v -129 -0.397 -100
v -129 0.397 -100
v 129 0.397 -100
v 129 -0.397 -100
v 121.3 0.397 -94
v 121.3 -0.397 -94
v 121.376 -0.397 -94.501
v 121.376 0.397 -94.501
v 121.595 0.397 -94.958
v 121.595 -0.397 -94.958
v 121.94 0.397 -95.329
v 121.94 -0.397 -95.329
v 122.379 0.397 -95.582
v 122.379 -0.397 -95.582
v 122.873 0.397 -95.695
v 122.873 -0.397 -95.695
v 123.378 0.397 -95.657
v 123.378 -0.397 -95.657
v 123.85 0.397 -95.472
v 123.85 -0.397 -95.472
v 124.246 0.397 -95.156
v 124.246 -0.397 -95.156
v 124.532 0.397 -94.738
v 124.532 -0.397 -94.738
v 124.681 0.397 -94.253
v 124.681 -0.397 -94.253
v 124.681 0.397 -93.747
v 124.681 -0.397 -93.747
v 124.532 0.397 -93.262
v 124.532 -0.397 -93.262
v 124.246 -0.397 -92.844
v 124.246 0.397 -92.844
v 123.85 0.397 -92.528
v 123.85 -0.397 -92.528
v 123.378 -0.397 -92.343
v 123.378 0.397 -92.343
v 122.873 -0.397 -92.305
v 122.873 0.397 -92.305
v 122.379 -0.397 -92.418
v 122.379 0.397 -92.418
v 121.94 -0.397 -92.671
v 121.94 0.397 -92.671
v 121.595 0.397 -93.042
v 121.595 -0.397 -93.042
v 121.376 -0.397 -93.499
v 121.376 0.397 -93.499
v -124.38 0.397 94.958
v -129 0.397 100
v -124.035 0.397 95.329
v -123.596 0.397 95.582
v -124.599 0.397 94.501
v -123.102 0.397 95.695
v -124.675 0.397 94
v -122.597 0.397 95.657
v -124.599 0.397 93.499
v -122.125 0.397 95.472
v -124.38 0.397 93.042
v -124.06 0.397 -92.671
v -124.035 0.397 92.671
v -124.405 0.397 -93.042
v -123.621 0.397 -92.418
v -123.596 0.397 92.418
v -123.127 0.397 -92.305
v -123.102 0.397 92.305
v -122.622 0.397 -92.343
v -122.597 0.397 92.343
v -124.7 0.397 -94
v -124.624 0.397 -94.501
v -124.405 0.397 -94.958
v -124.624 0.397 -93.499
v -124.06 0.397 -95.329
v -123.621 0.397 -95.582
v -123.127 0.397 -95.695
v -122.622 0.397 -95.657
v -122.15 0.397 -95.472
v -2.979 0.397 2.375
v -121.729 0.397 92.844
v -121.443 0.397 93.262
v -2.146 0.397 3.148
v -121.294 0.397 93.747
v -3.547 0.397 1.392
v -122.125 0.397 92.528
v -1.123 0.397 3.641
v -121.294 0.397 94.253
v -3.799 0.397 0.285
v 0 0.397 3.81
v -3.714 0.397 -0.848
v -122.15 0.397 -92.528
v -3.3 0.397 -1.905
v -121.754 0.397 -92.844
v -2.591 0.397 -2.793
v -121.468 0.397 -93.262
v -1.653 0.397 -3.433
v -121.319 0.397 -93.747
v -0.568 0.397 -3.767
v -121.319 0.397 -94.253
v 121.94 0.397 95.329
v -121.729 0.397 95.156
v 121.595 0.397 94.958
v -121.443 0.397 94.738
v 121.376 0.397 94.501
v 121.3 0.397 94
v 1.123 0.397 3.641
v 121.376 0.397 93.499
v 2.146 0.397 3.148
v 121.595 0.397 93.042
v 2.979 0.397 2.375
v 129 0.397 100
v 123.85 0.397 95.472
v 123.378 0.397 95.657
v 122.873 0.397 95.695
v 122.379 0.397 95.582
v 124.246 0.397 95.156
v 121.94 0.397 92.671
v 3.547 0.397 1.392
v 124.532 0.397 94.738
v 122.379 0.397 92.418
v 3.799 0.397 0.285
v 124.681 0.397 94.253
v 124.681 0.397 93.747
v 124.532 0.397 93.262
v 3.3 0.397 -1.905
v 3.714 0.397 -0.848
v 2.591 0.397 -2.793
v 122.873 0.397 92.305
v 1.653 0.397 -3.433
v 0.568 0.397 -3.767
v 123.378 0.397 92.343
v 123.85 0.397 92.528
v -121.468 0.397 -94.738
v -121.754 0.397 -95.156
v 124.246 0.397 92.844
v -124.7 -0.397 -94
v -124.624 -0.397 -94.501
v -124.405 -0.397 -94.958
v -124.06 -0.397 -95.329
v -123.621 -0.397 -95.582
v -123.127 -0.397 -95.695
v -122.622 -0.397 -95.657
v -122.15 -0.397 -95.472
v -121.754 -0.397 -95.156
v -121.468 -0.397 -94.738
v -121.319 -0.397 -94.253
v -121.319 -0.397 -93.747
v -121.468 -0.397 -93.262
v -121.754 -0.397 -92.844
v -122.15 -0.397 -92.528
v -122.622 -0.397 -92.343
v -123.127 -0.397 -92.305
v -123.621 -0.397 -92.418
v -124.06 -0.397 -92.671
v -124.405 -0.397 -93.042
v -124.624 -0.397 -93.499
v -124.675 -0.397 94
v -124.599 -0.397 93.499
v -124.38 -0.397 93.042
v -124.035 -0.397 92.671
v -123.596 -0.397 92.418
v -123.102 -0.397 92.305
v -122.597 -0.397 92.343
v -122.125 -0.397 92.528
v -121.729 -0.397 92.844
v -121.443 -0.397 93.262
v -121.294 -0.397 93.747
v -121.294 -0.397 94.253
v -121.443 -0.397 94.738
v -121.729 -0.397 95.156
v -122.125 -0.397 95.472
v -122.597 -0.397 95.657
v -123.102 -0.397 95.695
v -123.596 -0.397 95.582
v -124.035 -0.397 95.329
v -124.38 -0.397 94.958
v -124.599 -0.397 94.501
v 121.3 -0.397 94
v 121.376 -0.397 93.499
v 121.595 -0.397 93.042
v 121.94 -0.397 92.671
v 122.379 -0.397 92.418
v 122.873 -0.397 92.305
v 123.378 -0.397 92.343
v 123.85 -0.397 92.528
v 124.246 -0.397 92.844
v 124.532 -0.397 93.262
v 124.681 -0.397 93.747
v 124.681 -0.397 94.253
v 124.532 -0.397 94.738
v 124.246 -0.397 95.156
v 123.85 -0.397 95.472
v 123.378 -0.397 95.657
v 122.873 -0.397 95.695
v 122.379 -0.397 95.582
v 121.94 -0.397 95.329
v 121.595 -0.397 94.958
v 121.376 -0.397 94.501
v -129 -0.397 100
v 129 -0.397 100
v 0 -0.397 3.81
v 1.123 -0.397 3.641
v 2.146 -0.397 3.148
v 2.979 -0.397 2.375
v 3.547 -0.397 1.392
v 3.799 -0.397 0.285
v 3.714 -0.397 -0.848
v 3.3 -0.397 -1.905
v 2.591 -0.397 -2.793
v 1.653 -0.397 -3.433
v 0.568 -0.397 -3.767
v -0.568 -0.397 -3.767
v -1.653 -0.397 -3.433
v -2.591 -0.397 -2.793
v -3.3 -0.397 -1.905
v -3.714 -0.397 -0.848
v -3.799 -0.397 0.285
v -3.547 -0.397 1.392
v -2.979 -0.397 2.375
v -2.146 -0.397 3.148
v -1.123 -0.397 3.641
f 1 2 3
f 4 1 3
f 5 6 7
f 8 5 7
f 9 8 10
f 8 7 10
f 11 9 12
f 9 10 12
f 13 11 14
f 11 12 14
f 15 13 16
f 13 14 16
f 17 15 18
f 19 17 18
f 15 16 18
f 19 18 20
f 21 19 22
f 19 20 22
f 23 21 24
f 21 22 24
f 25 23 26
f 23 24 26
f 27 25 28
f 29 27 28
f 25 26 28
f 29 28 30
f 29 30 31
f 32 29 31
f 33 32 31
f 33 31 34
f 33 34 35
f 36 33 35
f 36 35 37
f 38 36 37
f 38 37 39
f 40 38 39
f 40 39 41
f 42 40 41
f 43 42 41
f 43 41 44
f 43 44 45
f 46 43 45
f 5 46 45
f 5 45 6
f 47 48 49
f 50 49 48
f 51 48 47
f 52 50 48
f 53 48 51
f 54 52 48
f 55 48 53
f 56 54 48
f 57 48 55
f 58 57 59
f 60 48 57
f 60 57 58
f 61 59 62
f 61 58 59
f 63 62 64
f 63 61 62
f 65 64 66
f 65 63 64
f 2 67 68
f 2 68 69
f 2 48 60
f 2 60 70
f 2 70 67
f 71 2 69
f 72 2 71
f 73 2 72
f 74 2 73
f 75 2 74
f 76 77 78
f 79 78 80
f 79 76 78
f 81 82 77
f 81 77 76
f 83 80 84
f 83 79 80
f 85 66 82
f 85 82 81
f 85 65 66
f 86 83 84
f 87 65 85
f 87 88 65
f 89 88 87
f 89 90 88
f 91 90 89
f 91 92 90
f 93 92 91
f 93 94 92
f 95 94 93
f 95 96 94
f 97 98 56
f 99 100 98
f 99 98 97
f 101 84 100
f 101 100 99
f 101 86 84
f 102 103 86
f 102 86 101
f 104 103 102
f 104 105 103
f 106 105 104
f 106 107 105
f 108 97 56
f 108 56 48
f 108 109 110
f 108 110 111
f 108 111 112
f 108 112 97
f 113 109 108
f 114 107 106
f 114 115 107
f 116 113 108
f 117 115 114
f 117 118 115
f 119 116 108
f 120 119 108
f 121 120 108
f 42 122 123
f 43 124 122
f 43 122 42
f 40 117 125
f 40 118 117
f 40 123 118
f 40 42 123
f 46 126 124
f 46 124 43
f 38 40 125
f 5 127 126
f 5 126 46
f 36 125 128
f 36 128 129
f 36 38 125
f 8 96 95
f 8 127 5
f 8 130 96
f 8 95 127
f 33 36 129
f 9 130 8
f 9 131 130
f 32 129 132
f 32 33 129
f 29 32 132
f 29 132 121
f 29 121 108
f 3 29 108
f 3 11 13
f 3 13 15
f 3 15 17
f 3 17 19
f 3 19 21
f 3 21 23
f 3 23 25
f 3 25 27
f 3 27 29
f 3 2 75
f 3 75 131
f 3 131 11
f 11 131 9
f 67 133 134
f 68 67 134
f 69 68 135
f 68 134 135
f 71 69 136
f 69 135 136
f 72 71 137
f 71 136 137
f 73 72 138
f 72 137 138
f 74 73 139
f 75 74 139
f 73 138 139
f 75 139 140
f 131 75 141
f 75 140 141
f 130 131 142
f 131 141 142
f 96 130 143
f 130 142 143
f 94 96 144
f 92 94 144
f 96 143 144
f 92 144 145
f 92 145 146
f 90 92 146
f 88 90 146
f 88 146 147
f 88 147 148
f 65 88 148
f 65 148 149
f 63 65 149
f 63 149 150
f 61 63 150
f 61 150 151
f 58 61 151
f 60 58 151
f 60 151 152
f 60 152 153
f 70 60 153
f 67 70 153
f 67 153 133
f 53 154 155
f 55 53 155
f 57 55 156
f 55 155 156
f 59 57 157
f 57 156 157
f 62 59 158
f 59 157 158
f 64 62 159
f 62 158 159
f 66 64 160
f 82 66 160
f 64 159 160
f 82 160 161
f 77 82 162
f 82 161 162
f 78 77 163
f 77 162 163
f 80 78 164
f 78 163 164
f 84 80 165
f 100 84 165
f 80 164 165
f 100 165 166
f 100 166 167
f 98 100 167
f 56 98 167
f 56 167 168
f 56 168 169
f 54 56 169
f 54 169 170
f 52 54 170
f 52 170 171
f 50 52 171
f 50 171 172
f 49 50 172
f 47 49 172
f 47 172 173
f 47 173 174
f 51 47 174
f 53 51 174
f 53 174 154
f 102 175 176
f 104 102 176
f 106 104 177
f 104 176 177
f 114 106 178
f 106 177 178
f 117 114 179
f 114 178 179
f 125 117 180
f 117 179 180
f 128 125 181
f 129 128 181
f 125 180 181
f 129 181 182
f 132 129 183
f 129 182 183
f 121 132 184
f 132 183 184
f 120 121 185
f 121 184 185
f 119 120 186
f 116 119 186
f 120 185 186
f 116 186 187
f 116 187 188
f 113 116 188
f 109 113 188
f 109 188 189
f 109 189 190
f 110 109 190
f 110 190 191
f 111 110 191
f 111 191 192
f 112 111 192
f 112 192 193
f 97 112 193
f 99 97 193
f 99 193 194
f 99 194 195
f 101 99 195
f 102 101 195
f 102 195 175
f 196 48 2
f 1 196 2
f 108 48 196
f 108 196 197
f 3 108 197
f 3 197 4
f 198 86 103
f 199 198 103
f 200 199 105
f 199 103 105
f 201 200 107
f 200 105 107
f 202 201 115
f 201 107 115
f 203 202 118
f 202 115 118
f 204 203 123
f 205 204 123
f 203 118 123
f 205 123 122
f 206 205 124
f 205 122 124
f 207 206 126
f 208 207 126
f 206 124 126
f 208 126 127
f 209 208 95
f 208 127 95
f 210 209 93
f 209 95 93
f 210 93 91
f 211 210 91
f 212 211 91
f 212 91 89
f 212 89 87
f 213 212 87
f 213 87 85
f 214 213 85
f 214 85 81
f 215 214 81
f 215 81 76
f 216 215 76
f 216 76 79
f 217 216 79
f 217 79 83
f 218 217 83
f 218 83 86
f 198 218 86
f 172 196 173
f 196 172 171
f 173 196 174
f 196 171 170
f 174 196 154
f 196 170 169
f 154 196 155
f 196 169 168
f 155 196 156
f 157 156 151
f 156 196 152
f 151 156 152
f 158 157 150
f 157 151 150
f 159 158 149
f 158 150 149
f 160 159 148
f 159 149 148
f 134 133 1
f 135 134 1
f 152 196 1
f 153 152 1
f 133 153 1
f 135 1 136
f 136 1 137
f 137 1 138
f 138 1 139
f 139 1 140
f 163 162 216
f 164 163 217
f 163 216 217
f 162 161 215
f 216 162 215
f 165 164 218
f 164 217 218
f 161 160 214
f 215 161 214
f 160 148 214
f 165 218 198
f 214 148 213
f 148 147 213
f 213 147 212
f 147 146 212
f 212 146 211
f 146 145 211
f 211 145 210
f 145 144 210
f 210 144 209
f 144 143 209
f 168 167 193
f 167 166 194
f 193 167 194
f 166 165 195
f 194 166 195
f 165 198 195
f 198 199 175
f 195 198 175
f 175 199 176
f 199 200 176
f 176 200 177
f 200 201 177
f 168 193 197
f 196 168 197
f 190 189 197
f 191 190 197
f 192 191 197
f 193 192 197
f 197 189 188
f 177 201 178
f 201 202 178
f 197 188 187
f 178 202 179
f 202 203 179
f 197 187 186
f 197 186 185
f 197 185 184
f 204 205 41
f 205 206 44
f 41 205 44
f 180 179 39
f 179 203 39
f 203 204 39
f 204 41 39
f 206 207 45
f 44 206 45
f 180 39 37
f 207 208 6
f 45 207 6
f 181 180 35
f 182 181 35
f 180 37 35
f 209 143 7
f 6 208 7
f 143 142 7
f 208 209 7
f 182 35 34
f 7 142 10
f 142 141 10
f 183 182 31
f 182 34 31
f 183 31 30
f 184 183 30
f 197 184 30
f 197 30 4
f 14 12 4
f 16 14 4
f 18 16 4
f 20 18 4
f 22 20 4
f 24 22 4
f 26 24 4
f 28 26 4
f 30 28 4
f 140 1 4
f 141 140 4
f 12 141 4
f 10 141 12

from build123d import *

# Parameters (mm, degrees)
BOSS_EXTRUDE1_DEPTH      = 152.4
BOSS_EXTRUDE1_DEPTH_BACK = 152.4
SKETCH3_W                = 304.8
SKETCH3_H                = 0.79375
SKETCH4_OUTSIDE_W        = 393.01
SKETCH4_OUTSIDE_H        = 393.01
SKETCH4_OUTSIDE_W_2      = 258
SKETCH4_OUTSIDE_H_2      = 200
FIT2ENCLOSURE_DEPTH      = 0.79375
CUBEMOUNTHOLES_D         = 3.4
DRAINHOLE_REACH          = 165.223
SKETCH8_R                = 3.81


with BuildPart() as part:
    # Sketch3 → Boss-Extrude1 (new, two sides: drawn at the far end of the back side and taken through both)
    with BuildSketch(Plane.XY.offset(-BOSS_EXTRUDE1_DEPTH_BACK)):
        Rectangle(SKETCH3_W, SKETCH3_H)
    extrude(amount=BOSS_EXTRUDE1_DEPTH + BOSS_EXTRUDE1_DEPTH_BACK)

    # Sketch4 outside → Fit2Enclosure (cut)
    with BuildSketch(Plane(origin=(0, 0.396875, 0), x_dir=(1, 0, 0), z_dir=(0, 1, 0))):
        Rectangle(SKETCH4_OUTSIDE_W, SKETCH4_OUTSIDE_H)
        Rectangle(SKETCH4_OUTSIDE_W_2, SKETCH4_OUTSIDE_H_2, mode=Mode.SUBTRACT)
    extrude(amount=-FIT2ENCLOSURE_DEPTH, mode=Mode.SUBTRACT)

    # CubeMountHoles (through all)
    with Locations(Plane(origin=(0, 0.396875, 0), x_dir=(1, 0, 0), z_dir=(0, 1, 0))):
        with Locations((-123, 94), (123, 94), (123, -94), (-122.975, -94)):
            Hole(CUBEMOUNTHOLES_D / 2)

    # Sketch8 → DrainHole (cut, up to next)
    with BuildSketch(Plane(origin=(0, 0.396875, 0), x_dir=(1, 0, 0), z_dir=(0, 1, 0)), mode=Mode.PRIVATE) as drainhole_sk1:
        with Locations(Location((0, 0, 0), (0, 0, 270))):
            Circle(SKETCH8_R)
    drainhole_tool1 = extrude(drainhole_sk1.sketch, amount=-DRAINHOLE_REACH, mode=Mode.PRIVATE) & part.part
    add(drainhole_tool1.solids().sort_by_distance((0, 0.396875, 0))[0], mode=Mode.SUBTRACT)


solid = part.part
